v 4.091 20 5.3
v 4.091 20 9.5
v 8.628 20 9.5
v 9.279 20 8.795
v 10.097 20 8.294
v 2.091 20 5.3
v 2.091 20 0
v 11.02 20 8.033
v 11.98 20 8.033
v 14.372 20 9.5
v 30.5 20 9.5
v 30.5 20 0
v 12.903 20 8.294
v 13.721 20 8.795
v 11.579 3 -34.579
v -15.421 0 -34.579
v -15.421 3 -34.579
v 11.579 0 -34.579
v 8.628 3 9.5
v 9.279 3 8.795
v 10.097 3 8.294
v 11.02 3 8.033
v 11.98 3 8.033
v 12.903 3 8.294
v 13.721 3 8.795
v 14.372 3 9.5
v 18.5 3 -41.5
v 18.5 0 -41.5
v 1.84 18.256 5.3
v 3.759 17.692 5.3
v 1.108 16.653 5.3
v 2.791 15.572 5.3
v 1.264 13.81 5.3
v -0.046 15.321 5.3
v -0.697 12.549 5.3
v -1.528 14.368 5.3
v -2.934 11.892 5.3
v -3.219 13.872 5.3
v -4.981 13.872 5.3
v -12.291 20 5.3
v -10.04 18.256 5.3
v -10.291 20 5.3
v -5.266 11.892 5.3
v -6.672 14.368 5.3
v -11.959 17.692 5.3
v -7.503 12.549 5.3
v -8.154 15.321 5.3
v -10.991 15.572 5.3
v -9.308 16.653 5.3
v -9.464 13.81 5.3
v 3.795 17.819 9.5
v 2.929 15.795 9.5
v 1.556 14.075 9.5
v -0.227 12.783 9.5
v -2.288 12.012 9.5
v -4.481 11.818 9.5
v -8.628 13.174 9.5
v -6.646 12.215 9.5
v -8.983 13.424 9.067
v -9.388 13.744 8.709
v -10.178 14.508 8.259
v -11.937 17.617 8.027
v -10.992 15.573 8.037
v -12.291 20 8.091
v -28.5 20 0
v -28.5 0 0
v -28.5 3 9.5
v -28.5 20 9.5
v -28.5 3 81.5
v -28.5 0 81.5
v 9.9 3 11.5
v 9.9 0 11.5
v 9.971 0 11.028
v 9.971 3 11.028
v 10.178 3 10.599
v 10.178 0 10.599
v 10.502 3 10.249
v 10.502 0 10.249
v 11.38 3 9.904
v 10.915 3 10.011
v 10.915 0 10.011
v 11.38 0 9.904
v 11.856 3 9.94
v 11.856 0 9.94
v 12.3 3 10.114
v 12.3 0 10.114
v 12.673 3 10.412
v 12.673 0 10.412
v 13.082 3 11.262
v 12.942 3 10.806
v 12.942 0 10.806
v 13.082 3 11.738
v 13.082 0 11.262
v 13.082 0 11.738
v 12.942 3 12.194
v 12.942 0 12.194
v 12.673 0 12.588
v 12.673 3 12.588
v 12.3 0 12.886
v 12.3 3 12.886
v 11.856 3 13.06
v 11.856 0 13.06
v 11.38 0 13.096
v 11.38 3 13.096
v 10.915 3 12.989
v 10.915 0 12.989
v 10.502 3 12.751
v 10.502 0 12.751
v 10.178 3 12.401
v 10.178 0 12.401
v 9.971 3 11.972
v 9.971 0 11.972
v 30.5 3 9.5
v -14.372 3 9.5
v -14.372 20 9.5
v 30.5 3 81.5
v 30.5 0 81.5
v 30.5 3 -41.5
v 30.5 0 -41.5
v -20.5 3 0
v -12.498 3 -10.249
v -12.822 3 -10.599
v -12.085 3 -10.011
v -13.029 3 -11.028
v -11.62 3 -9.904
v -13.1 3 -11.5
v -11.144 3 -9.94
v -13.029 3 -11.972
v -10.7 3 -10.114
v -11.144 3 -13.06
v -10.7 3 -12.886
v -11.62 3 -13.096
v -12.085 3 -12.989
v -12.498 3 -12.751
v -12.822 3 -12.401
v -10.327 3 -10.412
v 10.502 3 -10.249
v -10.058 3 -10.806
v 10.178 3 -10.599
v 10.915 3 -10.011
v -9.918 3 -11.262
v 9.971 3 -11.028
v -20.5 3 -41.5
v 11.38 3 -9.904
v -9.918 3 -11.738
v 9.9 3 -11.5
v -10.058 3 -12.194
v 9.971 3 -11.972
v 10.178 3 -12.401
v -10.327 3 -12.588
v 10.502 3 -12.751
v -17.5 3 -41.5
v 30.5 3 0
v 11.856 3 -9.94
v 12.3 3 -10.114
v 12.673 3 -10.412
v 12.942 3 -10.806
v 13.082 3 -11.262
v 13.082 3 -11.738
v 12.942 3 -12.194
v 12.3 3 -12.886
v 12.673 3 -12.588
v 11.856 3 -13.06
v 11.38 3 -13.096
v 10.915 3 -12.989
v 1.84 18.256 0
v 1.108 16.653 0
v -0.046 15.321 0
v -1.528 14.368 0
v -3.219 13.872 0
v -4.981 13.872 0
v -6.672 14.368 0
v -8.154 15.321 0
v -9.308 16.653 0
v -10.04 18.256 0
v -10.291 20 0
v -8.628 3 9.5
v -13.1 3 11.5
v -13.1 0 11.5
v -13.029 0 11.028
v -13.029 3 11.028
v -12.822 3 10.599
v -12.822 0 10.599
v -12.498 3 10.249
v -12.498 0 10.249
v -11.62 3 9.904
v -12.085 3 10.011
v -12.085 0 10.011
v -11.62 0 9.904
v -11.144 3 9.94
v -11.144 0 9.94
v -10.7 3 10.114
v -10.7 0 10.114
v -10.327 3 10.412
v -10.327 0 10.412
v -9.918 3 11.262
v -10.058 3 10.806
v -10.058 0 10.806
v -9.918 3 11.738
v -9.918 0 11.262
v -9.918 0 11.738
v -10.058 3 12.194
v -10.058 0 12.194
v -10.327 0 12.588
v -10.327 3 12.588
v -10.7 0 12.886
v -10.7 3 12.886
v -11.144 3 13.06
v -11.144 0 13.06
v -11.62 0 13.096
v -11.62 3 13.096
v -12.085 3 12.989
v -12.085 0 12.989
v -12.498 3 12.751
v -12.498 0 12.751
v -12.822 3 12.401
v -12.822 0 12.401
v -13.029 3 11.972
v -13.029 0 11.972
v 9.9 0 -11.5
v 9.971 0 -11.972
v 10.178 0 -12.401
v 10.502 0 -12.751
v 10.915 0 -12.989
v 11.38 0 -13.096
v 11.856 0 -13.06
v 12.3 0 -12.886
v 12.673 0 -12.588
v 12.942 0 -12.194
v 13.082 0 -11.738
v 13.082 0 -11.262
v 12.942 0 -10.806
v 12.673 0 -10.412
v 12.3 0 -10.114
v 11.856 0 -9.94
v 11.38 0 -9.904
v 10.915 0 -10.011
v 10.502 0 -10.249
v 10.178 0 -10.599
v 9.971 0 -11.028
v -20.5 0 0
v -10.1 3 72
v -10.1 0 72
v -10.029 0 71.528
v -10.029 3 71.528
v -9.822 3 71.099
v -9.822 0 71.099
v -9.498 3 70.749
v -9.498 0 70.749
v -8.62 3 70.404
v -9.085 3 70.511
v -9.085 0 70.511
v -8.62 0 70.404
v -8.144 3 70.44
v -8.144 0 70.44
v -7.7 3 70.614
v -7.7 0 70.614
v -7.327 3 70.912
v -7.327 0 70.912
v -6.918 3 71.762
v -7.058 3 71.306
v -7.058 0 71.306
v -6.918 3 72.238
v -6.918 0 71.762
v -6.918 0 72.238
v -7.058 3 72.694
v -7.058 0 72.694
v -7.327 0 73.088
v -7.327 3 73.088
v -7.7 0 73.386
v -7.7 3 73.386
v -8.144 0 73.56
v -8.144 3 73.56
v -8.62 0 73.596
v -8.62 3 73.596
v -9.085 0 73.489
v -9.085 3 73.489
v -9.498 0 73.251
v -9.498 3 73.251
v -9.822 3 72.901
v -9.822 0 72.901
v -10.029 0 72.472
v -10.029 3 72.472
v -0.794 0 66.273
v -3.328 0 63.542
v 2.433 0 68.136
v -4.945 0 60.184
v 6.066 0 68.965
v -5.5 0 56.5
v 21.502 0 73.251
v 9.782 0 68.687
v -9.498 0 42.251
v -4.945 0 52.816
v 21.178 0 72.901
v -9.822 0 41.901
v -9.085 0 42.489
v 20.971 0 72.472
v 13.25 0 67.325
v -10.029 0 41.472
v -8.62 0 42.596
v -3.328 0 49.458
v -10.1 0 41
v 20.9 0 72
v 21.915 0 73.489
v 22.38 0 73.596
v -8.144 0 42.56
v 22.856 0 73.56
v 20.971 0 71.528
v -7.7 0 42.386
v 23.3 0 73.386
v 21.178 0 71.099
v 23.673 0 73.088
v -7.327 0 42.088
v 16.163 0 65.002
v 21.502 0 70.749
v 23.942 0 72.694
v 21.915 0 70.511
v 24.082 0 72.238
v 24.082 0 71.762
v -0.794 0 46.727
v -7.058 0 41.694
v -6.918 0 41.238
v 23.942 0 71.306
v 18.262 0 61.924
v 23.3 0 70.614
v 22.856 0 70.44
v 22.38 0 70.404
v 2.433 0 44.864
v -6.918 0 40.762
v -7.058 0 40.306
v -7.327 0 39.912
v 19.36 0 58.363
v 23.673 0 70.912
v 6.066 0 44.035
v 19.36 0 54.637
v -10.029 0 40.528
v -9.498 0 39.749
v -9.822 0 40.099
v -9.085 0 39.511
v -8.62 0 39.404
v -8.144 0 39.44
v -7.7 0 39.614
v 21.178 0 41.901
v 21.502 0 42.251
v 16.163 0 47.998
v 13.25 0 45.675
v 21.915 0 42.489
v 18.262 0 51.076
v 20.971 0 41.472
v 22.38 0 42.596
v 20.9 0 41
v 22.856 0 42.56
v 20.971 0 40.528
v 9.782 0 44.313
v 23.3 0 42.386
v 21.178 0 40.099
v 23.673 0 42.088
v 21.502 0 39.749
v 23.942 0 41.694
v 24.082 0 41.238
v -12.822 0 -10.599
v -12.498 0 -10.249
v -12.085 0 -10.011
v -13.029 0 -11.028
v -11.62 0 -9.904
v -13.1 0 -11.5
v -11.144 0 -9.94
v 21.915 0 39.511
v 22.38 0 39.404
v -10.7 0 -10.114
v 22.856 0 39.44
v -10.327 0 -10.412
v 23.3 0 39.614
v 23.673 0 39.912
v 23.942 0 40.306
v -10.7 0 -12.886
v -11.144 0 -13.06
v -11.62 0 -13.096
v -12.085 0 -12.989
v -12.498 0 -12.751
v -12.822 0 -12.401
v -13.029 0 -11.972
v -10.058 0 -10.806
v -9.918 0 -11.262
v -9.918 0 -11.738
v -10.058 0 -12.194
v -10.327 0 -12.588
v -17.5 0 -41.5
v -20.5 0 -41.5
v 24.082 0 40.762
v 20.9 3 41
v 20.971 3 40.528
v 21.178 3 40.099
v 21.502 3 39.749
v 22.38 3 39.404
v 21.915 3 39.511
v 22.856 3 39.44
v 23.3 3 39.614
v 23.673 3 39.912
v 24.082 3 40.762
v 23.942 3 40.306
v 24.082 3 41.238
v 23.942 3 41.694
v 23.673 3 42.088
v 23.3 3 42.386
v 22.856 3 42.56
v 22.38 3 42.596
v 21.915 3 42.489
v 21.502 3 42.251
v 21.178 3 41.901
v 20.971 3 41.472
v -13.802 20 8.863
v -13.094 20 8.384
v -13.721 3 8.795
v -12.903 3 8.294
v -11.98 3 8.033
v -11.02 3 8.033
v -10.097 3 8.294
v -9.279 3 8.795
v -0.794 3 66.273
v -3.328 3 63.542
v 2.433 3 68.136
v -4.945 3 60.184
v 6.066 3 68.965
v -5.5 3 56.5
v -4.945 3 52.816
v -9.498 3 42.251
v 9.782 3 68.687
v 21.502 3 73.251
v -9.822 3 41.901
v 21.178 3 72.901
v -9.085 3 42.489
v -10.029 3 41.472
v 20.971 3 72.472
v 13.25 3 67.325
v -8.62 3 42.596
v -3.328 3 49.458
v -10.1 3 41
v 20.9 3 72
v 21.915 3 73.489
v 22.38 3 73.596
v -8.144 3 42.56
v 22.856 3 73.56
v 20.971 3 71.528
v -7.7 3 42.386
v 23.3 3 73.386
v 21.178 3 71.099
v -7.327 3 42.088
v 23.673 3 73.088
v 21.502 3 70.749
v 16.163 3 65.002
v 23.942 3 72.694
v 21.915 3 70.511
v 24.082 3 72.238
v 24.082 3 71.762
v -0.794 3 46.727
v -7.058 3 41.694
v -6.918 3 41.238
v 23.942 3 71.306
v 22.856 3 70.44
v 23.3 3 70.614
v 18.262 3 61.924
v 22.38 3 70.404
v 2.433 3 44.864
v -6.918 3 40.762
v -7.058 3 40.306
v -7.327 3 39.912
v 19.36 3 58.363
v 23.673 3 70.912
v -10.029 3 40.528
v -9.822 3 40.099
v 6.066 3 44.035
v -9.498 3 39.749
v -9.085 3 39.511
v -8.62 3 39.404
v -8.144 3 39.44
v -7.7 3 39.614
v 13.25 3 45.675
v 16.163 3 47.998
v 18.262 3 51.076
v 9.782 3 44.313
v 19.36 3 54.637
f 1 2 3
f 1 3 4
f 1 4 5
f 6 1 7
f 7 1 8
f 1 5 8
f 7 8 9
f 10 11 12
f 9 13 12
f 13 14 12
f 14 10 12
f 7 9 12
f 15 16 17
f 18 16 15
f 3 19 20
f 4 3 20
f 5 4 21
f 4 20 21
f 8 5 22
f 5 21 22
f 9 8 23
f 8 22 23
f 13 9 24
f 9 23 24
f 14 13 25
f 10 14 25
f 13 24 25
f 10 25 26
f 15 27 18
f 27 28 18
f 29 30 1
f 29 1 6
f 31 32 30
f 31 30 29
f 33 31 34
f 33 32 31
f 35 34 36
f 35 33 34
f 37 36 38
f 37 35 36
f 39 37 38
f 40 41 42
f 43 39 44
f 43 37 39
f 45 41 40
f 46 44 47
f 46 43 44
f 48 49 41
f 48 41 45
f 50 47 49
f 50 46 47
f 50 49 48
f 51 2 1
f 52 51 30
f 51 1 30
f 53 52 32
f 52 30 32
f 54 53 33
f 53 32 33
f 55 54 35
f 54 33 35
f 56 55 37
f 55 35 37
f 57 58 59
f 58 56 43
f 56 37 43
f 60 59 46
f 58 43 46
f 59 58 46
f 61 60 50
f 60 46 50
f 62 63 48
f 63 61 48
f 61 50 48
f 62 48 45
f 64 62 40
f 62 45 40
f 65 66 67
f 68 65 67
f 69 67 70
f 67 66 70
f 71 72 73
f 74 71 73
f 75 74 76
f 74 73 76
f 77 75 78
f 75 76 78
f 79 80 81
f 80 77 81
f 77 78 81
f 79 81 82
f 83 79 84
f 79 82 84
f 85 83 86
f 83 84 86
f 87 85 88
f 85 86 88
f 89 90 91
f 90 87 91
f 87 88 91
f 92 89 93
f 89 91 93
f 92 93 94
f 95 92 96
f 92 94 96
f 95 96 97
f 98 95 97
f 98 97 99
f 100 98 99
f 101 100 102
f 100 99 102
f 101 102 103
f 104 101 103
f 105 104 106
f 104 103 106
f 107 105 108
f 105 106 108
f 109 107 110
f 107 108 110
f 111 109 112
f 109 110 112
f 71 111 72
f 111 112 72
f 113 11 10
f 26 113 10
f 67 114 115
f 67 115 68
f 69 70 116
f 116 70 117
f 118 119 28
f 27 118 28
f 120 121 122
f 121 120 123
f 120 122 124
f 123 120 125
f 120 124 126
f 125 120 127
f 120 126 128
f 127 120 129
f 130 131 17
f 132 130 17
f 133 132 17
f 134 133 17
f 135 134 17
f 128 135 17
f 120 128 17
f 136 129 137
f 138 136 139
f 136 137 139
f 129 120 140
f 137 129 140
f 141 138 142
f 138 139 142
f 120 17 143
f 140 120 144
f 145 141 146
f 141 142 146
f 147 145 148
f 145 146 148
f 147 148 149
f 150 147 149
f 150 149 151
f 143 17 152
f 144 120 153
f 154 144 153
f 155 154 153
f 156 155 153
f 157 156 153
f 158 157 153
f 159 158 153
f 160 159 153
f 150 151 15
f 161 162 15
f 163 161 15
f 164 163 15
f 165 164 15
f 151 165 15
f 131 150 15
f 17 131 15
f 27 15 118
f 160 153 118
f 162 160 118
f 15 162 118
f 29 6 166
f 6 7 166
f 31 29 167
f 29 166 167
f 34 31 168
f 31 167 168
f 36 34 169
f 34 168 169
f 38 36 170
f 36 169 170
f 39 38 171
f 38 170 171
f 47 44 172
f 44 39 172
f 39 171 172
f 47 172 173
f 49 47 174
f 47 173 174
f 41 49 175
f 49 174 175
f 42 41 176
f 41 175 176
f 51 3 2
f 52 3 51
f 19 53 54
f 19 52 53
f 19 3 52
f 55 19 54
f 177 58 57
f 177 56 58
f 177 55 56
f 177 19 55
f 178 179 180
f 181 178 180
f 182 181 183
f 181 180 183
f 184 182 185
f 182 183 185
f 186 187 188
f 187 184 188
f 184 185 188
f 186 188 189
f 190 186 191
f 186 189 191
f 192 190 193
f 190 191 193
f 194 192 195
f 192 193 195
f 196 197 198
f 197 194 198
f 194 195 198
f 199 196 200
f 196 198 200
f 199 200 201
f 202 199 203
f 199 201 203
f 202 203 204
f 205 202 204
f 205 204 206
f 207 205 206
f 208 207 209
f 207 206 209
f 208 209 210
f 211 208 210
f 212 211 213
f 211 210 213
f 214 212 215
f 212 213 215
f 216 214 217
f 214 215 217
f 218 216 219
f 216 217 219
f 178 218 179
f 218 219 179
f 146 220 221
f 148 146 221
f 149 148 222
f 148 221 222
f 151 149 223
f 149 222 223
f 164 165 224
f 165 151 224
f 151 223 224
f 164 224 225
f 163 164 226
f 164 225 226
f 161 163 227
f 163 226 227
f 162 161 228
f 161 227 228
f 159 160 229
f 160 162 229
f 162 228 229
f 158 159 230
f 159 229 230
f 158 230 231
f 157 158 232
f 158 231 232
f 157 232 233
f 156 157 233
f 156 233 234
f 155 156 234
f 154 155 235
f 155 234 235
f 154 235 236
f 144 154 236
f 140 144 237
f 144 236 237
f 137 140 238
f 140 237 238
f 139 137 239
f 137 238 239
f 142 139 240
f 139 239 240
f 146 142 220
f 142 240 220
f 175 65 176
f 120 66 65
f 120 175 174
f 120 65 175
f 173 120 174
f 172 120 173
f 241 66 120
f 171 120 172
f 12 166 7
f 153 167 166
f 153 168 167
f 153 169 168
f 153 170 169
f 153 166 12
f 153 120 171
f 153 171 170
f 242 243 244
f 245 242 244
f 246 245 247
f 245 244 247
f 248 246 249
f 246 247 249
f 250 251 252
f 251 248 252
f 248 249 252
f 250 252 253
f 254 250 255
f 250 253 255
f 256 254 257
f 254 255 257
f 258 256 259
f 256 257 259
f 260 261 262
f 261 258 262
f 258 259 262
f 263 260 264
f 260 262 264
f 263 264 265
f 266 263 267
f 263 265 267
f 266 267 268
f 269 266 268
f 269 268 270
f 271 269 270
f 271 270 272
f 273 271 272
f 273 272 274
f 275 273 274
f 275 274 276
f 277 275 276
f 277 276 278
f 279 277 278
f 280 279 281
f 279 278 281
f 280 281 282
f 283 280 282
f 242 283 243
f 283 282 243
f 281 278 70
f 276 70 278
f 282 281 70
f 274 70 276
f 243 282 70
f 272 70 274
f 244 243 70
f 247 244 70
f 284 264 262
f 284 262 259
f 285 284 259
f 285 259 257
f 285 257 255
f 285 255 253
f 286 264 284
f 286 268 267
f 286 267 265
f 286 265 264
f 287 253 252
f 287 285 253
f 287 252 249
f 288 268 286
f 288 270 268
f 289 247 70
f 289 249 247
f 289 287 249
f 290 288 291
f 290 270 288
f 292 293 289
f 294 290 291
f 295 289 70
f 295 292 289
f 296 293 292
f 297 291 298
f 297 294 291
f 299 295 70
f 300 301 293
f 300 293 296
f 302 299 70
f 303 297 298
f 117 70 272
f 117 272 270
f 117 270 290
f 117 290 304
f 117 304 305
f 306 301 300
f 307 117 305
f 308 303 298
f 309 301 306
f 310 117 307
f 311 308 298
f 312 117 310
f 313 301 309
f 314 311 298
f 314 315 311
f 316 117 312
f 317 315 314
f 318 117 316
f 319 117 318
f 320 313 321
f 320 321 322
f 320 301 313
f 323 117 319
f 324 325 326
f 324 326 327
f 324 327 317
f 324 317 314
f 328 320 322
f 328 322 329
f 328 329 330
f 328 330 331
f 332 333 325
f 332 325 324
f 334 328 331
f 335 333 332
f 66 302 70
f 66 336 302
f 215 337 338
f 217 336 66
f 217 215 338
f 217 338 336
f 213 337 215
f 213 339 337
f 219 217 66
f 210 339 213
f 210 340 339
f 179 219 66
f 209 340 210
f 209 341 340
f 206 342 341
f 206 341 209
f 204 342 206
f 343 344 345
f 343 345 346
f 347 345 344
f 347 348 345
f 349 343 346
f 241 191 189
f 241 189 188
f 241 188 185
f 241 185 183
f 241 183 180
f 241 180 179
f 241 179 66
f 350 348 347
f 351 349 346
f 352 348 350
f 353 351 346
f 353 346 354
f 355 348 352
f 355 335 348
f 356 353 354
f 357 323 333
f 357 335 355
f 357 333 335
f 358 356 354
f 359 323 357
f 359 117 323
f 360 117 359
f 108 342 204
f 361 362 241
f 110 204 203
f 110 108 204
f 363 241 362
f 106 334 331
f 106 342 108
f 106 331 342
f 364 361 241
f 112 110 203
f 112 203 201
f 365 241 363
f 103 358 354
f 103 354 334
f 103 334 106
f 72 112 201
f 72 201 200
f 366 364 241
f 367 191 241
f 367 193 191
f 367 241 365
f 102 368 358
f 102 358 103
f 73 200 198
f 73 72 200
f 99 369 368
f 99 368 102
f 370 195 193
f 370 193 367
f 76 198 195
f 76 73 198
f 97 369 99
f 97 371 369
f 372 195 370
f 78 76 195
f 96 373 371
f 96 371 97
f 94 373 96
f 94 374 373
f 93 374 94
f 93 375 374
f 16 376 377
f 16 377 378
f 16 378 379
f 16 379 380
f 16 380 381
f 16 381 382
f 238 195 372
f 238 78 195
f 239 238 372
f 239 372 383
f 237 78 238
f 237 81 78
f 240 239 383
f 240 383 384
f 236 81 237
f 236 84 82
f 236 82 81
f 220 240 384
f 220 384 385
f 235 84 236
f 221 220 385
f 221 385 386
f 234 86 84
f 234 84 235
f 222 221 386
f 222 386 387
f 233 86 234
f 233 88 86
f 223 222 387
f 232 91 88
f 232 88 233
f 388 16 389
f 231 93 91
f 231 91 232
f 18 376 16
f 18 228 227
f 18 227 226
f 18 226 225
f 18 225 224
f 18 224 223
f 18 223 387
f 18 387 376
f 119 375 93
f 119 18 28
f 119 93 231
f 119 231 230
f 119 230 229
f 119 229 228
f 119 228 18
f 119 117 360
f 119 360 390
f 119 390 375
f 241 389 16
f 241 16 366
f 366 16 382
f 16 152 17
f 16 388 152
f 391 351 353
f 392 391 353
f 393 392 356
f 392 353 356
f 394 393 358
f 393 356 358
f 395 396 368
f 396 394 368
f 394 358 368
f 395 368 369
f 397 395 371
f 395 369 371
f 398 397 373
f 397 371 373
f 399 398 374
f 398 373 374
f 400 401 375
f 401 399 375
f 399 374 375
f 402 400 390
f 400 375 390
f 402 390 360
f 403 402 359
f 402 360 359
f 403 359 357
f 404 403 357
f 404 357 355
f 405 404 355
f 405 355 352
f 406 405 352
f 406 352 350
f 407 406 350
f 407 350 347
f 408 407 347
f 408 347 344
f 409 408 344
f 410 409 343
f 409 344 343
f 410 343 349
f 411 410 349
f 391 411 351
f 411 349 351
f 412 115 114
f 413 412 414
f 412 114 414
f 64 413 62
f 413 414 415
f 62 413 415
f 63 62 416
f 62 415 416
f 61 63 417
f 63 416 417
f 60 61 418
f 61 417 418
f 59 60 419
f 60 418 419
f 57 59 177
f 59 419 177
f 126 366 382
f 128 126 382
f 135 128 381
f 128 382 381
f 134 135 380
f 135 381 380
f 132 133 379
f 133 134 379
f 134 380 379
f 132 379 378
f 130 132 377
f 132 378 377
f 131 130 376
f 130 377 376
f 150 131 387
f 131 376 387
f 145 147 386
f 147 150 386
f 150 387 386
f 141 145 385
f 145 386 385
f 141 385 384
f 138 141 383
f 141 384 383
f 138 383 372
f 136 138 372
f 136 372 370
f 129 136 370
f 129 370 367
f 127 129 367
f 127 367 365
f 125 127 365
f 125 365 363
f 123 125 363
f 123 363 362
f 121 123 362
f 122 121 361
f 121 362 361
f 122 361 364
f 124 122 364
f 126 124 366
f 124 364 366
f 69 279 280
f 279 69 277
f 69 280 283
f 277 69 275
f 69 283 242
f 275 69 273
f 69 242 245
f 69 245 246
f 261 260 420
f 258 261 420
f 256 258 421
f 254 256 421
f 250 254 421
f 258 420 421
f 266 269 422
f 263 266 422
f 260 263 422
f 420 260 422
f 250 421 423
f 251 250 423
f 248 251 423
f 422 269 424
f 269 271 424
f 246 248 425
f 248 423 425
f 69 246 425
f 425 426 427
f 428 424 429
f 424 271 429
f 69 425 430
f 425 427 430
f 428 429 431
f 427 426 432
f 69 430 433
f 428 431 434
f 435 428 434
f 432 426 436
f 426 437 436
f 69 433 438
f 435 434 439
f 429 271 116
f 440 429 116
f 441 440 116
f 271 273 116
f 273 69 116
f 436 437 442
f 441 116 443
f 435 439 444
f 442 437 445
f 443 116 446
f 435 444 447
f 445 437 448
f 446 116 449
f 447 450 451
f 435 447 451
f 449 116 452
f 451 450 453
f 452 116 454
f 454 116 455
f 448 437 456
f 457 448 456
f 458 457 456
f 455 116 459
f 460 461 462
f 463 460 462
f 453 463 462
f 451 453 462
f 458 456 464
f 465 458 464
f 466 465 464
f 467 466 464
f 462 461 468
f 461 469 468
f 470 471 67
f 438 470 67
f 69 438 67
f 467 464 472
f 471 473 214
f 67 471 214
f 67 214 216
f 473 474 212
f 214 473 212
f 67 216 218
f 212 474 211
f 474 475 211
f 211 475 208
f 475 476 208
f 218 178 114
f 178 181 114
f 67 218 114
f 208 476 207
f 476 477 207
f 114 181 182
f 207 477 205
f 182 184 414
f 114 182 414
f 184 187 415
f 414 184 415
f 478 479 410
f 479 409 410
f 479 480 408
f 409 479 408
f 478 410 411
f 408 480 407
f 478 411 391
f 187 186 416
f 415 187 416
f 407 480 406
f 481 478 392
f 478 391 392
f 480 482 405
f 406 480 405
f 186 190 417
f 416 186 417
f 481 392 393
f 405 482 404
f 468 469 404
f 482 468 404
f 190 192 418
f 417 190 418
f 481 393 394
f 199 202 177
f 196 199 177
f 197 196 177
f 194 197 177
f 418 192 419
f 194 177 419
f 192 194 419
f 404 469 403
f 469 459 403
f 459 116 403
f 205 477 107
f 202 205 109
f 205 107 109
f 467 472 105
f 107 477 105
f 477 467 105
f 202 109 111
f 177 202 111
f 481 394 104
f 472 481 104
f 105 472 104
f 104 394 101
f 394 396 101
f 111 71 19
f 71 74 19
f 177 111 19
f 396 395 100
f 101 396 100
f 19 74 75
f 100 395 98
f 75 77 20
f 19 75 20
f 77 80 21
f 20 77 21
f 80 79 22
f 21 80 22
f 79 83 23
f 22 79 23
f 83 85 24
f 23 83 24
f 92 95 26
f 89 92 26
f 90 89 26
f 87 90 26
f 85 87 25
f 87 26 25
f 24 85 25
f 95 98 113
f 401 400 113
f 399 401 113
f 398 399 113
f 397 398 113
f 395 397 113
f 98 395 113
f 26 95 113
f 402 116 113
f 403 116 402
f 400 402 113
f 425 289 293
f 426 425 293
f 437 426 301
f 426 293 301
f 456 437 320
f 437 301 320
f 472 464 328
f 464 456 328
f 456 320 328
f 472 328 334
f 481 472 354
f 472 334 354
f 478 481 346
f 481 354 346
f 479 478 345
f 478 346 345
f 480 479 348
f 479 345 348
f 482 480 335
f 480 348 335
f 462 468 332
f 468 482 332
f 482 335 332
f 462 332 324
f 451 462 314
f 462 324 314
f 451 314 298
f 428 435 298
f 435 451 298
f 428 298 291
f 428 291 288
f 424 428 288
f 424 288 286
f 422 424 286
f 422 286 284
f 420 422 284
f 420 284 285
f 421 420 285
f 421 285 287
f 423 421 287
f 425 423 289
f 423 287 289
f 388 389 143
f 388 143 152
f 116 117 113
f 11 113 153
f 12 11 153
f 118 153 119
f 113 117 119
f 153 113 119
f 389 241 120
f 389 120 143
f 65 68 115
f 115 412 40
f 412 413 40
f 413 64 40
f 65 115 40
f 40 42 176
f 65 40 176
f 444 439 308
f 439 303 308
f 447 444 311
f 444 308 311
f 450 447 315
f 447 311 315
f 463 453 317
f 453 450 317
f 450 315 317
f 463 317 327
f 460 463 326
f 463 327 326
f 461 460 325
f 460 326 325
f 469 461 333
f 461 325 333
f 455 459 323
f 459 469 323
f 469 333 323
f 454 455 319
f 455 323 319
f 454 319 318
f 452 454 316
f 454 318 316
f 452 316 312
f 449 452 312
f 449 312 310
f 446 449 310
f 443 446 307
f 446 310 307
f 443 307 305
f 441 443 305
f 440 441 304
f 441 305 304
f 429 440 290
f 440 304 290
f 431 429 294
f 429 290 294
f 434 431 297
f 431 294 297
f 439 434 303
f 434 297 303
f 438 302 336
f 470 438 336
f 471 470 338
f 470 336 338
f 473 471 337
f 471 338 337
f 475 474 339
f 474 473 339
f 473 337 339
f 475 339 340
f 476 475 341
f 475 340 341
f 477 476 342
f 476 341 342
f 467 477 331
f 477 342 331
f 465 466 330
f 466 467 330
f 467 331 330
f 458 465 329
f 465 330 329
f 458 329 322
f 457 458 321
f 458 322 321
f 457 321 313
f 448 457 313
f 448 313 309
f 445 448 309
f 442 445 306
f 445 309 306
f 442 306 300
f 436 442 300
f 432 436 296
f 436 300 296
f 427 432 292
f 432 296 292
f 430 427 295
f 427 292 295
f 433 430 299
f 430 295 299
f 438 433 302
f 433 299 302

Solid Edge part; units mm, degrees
sketch "Sketch1" plane through (0, 0, 0) normal (0, 1, 0) x (-1, 0, 0)
  circle A0 centre (-11.5, 11.5) radius 1.6
  circle A1 centre (11.5, 11.5) radius 1.6
  circle A2 centre (-11.5, -11.5) radius 1.6
  circle A3 centre (11.5, -11.5) radius 1.6
  circle A4 centre (-7, 56.5) radius 12.5
  circle A5 centre (-22.5, 72) radius 1.6
  circle A6 centre (8.5, 72) radius 1.6
  circle A7 centre (8.5, 41) radius 1.6
  circle A8 centre (-22.5, 41) radius 1.6
  line L0 (20.5, -41.5) -> (17.5, -41.5)
  line L1 (17.5, -41.5) -> (15.4213, -34.5787)
  line L2 (15.4213, -34.5787) -> (-11.5787, -34.5787)
  line L3 (-18.5, -41.5) -> (-11.5787, -34.5787)
  line L4 (-30.5, -41.5) -> (-18.5, -41.5)
  line L5 (-30.5, 81.5) -> (-30.5, -41.5)
  line L6 (28.5, 81.5) -> (-30.5, 81.5)
  line L7 (28.5, 0) -> (28.5, 81.5)
  line L8 (28.5, 0) -> (20.5, 0)
  line L9 (20.5, 0) -> (20.5, -41.5)
  dimension "D1" = 17
  dimension "D2" = 23
  dimension "D3" = 23
  dimension "D4" = 70
  dimension "D5" = 18.5
  dimension "D6" = 45
  dimension "D7" = 31
  dimension "D8" = 31
  dimension "D9" = 8
  dimension "D10" = 3
extrude "Protrusion1" add sketch "Sketch1" along normal blind 3
sketch "Sketch2" plane through (1, 3, 20) normal (0, 1, 0) x (-1, 0, 0)
  line L0 (15.3723, -10.5) -> (29.5, -10.5)
  line L1 (29.5, -10.5) -> (29.5, -20)
  line L2 (29.5, -20) -> (21.5, -20)
  line L3 (-29.5, -20) -> (21.5, -20)
  line L4 (-29.5, -20) -> (-29.5, -10.5)
  line L5 (-29.5, -10.5) -> (-13.3723, -10.5)
  line L6 (-7.6277, -10.5) -> (9.6277, -10.5)
  arc A0 (15.3723, -10.5) -> (9.6277, -10.5) centre (12.5, -8.5) cw
  arc A1 (-7.6277, -10.5) -> (-13.3723, -10.5) centre (-10.5, -8.5) cw
  dimension "D1" = 9.5
extrude "Protrusion2" add sketch "Sketch2" along normal blind 17
sketch "Sketch3" plane through (1, 20, -16.25) normal (0, 1, 0) x (-1, 0, 0)
  line L0 (13.2911, 25.75) -> (13.2911, 21.55)
  line L1 (13.2911, 21.55) -> (11.2911, 21.55)
  line L2 (11.2911, 21.55) -> (11.2911, 15.75)
  line L3 (11.2911, 15.75) -> (13.3, 15.75)
  line L4 (13.3, 15.75) -> (13.3, 12.25)
  line L5 (13.3, 12.25) -> (17.1, 12.25)
  line L6 (17.1, 12.25) -> (17.1, -19.45)
  line L7 (17.1, -19.45) -> (5.1, -19.45)
  line L8 (13.2911, 25.75) -> (5.1, 25.75)
  dimension "D1" = 1.6
  dimension "D2" = 2
revolve "RevolvedCutout_1" cut sketch "Sketch3" angle 180 about axis through (-4.1, 20, -35.7) along (0, 0, 1)
